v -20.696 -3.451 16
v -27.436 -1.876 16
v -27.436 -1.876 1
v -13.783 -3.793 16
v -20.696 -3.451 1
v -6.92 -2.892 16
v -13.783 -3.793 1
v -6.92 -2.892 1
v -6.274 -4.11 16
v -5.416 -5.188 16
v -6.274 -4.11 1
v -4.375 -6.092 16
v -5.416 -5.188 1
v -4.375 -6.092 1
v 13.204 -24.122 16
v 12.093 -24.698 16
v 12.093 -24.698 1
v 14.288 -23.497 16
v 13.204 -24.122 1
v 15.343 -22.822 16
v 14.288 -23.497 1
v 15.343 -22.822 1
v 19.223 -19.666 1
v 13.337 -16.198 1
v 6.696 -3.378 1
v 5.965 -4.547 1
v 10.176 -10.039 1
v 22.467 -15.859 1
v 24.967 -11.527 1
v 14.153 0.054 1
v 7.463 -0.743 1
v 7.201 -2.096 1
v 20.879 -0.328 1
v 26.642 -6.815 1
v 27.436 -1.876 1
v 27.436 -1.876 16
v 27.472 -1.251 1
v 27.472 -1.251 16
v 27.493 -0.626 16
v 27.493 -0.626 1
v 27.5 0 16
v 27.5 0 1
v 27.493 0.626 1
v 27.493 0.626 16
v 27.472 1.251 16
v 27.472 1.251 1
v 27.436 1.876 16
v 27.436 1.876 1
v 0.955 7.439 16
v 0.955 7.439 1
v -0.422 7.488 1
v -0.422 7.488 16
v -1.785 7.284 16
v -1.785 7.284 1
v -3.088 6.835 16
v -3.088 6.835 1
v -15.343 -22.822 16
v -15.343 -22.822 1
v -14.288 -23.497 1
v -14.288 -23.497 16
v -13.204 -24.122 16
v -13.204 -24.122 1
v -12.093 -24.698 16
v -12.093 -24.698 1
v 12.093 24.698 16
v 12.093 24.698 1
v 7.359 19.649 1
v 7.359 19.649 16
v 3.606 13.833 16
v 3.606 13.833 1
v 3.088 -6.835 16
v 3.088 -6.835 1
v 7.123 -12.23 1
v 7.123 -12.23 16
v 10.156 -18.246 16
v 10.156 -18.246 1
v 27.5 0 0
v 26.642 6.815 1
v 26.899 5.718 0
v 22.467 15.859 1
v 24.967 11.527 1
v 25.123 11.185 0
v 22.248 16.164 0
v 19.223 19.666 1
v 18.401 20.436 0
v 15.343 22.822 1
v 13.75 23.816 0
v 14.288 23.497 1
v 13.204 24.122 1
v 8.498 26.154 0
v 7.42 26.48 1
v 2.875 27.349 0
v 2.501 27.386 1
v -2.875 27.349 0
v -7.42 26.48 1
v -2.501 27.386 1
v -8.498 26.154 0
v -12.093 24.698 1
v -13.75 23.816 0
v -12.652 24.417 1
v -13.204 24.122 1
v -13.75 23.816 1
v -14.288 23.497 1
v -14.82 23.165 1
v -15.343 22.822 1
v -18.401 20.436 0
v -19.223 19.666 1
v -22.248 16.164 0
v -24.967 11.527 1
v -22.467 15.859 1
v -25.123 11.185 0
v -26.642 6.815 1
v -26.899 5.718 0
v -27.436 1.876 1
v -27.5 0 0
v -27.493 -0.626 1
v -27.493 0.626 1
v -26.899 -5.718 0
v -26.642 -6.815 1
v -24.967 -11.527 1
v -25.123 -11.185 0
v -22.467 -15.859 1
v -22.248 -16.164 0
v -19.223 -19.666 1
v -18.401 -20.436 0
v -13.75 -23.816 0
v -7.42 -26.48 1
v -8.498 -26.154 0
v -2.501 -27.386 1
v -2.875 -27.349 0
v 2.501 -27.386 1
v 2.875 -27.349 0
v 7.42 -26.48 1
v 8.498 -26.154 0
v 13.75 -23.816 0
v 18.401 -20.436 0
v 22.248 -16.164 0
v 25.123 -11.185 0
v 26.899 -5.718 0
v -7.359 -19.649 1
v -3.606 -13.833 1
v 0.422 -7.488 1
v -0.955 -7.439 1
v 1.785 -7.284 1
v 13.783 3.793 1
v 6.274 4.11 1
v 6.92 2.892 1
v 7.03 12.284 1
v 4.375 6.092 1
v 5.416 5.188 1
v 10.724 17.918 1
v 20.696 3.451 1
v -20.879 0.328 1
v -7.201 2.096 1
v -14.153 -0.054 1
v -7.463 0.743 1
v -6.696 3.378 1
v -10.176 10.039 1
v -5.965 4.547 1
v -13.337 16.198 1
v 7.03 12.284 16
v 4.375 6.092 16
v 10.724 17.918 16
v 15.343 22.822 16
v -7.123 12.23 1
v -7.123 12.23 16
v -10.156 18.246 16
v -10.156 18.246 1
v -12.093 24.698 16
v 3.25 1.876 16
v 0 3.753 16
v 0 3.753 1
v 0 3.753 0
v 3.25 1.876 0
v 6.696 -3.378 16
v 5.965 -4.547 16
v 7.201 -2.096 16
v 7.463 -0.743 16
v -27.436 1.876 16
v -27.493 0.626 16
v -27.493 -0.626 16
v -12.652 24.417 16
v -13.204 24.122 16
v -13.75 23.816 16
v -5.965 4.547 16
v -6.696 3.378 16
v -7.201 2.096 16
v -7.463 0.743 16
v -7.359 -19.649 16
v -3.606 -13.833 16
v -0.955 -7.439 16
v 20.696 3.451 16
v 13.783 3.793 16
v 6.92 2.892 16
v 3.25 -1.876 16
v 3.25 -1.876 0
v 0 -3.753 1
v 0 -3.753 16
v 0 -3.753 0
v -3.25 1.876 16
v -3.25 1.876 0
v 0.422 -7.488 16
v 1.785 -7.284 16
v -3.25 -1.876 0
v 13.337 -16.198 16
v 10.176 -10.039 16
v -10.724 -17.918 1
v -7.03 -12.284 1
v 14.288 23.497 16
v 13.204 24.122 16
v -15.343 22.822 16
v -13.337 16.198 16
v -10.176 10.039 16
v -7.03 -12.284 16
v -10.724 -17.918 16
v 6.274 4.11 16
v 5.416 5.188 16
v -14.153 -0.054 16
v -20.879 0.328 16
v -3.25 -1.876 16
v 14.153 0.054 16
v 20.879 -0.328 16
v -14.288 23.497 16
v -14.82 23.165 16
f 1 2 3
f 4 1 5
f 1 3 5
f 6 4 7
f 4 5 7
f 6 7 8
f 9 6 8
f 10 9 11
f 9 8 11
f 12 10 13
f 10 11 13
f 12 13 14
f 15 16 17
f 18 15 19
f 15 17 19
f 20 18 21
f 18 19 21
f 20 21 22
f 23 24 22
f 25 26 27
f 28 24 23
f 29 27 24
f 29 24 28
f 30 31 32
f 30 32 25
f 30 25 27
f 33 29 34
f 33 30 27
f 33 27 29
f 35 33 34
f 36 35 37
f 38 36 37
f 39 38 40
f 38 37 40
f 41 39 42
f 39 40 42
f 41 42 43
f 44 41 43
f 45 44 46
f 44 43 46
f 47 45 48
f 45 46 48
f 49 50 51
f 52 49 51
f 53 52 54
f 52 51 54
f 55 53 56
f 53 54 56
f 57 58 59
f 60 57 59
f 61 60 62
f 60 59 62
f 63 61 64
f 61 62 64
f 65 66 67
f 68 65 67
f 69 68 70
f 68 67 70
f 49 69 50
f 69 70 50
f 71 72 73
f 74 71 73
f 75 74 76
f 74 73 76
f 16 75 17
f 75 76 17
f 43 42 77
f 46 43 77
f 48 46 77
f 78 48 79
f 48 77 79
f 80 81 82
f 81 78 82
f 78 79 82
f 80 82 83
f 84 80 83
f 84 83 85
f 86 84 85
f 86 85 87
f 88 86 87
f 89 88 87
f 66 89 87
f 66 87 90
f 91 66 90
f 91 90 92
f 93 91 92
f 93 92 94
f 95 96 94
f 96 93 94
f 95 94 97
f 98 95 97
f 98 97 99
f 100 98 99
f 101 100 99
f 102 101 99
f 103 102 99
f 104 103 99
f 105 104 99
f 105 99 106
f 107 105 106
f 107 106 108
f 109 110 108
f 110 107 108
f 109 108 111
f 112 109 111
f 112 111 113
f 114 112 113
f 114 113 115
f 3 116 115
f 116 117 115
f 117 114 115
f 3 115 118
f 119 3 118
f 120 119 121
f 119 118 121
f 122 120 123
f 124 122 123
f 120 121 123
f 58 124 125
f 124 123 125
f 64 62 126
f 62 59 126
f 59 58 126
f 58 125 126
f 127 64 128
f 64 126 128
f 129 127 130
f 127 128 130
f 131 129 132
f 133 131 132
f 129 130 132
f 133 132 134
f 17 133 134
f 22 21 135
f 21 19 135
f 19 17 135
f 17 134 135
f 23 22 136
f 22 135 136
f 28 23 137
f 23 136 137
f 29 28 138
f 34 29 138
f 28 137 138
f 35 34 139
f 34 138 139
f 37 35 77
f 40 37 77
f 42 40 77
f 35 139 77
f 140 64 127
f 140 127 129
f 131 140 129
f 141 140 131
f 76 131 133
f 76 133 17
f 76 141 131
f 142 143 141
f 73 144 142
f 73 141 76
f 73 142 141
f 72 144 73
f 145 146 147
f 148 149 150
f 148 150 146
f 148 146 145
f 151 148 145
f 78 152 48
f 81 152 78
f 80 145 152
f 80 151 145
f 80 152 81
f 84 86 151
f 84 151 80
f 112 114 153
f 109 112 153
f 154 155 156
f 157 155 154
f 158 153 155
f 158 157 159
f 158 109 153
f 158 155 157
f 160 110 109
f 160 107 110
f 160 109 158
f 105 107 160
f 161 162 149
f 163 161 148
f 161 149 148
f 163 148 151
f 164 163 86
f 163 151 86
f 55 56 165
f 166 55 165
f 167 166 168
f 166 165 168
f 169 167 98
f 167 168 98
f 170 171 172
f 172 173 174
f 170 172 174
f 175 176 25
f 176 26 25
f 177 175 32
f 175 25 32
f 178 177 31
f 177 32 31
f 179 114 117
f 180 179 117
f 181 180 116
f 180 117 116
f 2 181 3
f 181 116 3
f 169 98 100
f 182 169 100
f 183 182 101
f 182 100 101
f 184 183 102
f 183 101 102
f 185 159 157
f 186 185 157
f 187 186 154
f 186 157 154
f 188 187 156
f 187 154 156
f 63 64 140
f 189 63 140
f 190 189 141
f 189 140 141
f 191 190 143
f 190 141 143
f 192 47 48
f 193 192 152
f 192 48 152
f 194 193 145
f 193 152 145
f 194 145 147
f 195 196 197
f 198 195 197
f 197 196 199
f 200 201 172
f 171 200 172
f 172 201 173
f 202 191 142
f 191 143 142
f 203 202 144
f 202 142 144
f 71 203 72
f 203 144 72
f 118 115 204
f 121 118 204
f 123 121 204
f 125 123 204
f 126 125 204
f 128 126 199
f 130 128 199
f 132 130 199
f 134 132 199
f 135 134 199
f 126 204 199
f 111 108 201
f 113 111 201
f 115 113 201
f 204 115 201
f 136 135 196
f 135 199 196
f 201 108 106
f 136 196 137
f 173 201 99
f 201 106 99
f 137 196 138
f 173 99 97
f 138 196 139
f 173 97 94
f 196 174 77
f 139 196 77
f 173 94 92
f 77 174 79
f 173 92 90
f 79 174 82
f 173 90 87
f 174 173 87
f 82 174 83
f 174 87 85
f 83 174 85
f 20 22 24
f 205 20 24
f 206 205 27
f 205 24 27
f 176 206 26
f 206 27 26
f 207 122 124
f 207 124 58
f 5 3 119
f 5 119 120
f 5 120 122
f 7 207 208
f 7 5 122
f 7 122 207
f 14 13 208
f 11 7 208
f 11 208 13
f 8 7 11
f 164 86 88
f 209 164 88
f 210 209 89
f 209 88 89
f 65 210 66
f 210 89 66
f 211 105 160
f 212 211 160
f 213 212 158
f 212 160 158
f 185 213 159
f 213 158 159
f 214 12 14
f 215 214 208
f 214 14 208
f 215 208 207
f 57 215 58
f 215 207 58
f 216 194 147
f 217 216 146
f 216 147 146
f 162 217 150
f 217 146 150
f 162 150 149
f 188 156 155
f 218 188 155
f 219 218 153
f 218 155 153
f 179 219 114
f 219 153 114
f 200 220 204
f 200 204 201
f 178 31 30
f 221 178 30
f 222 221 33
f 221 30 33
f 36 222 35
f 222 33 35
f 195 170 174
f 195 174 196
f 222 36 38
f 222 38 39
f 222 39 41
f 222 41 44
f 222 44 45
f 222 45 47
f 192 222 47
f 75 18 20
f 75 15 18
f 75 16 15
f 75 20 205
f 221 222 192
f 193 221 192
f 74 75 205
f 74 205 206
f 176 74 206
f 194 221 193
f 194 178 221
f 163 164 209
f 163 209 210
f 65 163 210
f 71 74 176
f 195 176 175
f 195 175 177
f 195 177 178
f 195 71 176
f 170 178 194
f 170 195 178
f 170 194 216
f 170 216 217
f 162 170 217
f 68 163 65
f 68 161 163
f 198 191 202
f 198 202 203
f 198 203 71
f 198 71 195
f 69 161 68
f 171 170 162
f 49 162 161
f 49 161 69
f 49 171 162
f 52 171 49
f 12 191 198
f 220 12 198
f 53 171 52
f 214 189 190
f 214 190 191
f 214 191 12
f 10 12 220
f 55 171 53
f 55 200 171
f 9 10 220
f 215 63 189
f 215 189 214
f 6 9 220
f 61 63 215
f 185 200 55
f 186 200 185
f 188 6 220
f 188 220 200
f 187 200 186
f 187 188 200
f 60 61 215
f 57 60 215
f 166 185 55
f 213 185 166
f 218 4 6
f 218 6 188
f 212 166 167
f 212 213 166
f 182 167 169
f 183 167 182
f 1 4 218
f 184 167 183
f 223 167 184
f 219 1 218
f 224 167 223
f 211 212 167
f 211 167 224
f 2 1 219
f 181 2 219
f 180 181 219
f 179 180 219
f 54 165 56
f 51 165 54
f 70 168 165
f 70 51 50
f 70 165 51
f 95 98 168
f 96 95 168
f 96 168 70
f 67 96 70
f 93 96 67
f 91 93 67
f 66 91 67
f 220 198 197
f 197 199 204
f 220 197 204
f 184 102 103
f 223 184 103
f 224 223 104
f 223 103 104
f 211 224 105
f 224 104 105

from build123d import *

# Parameters (mm, degrees)
F0_R     = 27.5
F0_R_2   = 7.5
F1_DEPTH = 1
F3_DEPTH = 15
F4_COUNT = 6
F5_DEPTH = 16


with BuildPart() as f1:
    # F0 (on Top) → F1 (new body)
    with BuildSketch(Plane.XY):
        Circle(F0_R)
        Circle(F0_R_2, mode=Mode.SUBTRACT)
        Circle(F0_R_2)
        Polygon((-3.25, 1.876388), (0, 3.752777), (3.25, 1.876388), (3.25, -1.876388), (0, -3.752777), (-3.25, -1.876388), align=None, mode=Mode.SUBTRACT)
    extrude(amount=F1_DEPTH)

    # F2 (on face) → F3 (join)
    with BuildSketch(Plane.XY.offset(1)):
        with BuildLine():
            ThreePointArc((-27.43591, 1.876388), (-27.5, 0), (-27.43591, -1.876388))
            ThreePointArc((-27.43591, -1.876388), (-15.342955, -3.824912), (-3.25, -1.876388))
            Line((-3.25, -1.876388), (-3.25, 1.876388))
            ThreePointArc((-3.25, 1.876388), (-15.342955, -0.072135), (-27.43591, 1.876388))
        make_face()
        with BuildLine():
            ThreePointArc((3.25, -1.876388), (15.342955, 0.072135), (27.43591, -1.876388))
            ThreePointArc((27.43591, -1.876388), (27.483973, -0.938741), (27.5, 0))
            ThreePointArc((27.5, 0), (27.483973, 0.938741), (27.43591, 1.876388))
            ThreePointArc((27.43591, 1.876388), (15.342955, 3.824912), (3.25, 1.876388))
            Line((3.25, 1.876388), (3.25, -1.876388))
        make_face()
    extrude(amount=F3_DEPTH)



with BuildPart() as f4_1:
    # F4: instance of F1
    add(f1.part.rotate(Axis((0, 0, 0), (0, 0, 1)), 1 * 360 / F4_COUNT))


with BuildPart() as f4_2:
    # F4: instance of F1
    add(f1.part.rotate(Axis((0, 0, 0), (0, 0, 1)), 2 * 360 / F4_COUNT))


with BuildPart() as f4_3:
    # F4: instance of F1
    add(f1.part.rotate(Axis((0, 0, 0), (0, 0, 1)), 3 * 360 / F4_COUNT))


with BuildPart() as f4_4:
    # F4: instance of F1
    add(f1.part.rotate(Axis((0, 0, 0), (0, 0, 1)), 4 * 360 / F4_COUNT))


with BuildPart() as f4_5:
    # F4: instance of F1
    add(f1.part.rotate(Axis((0, 0, 0), (0, 0, 1)), 5 * 360 / F4_COUNT))


with BuildPart() as f1_1:
    add(f1.part)

    add(f4_1.part)  # F5 merges F4_1

    add(f4_2.part)  # F5 merges F4_2

    add(f4_3.part)  # F5 merges F4_3

    add(f4_4.part)  # F5 merges F4_4

    add(f4_5.part)  # F5 merges F4_5
    # F0 (on Top) → F5 (join)
    with BuildSketch(Plane.XY):
        Circle(F0_R_2)
        Polygon((-3.25, 1.876388), (0, 3.752777), (3.25, 1.876388), (3.25, -1.876388), (0, -3.752777), (-3.25, -1.876388), align=None, mode=Mode.SUBTRACT)
    extrude(amount=F5_DEPTH)


solid = f1_1.part
